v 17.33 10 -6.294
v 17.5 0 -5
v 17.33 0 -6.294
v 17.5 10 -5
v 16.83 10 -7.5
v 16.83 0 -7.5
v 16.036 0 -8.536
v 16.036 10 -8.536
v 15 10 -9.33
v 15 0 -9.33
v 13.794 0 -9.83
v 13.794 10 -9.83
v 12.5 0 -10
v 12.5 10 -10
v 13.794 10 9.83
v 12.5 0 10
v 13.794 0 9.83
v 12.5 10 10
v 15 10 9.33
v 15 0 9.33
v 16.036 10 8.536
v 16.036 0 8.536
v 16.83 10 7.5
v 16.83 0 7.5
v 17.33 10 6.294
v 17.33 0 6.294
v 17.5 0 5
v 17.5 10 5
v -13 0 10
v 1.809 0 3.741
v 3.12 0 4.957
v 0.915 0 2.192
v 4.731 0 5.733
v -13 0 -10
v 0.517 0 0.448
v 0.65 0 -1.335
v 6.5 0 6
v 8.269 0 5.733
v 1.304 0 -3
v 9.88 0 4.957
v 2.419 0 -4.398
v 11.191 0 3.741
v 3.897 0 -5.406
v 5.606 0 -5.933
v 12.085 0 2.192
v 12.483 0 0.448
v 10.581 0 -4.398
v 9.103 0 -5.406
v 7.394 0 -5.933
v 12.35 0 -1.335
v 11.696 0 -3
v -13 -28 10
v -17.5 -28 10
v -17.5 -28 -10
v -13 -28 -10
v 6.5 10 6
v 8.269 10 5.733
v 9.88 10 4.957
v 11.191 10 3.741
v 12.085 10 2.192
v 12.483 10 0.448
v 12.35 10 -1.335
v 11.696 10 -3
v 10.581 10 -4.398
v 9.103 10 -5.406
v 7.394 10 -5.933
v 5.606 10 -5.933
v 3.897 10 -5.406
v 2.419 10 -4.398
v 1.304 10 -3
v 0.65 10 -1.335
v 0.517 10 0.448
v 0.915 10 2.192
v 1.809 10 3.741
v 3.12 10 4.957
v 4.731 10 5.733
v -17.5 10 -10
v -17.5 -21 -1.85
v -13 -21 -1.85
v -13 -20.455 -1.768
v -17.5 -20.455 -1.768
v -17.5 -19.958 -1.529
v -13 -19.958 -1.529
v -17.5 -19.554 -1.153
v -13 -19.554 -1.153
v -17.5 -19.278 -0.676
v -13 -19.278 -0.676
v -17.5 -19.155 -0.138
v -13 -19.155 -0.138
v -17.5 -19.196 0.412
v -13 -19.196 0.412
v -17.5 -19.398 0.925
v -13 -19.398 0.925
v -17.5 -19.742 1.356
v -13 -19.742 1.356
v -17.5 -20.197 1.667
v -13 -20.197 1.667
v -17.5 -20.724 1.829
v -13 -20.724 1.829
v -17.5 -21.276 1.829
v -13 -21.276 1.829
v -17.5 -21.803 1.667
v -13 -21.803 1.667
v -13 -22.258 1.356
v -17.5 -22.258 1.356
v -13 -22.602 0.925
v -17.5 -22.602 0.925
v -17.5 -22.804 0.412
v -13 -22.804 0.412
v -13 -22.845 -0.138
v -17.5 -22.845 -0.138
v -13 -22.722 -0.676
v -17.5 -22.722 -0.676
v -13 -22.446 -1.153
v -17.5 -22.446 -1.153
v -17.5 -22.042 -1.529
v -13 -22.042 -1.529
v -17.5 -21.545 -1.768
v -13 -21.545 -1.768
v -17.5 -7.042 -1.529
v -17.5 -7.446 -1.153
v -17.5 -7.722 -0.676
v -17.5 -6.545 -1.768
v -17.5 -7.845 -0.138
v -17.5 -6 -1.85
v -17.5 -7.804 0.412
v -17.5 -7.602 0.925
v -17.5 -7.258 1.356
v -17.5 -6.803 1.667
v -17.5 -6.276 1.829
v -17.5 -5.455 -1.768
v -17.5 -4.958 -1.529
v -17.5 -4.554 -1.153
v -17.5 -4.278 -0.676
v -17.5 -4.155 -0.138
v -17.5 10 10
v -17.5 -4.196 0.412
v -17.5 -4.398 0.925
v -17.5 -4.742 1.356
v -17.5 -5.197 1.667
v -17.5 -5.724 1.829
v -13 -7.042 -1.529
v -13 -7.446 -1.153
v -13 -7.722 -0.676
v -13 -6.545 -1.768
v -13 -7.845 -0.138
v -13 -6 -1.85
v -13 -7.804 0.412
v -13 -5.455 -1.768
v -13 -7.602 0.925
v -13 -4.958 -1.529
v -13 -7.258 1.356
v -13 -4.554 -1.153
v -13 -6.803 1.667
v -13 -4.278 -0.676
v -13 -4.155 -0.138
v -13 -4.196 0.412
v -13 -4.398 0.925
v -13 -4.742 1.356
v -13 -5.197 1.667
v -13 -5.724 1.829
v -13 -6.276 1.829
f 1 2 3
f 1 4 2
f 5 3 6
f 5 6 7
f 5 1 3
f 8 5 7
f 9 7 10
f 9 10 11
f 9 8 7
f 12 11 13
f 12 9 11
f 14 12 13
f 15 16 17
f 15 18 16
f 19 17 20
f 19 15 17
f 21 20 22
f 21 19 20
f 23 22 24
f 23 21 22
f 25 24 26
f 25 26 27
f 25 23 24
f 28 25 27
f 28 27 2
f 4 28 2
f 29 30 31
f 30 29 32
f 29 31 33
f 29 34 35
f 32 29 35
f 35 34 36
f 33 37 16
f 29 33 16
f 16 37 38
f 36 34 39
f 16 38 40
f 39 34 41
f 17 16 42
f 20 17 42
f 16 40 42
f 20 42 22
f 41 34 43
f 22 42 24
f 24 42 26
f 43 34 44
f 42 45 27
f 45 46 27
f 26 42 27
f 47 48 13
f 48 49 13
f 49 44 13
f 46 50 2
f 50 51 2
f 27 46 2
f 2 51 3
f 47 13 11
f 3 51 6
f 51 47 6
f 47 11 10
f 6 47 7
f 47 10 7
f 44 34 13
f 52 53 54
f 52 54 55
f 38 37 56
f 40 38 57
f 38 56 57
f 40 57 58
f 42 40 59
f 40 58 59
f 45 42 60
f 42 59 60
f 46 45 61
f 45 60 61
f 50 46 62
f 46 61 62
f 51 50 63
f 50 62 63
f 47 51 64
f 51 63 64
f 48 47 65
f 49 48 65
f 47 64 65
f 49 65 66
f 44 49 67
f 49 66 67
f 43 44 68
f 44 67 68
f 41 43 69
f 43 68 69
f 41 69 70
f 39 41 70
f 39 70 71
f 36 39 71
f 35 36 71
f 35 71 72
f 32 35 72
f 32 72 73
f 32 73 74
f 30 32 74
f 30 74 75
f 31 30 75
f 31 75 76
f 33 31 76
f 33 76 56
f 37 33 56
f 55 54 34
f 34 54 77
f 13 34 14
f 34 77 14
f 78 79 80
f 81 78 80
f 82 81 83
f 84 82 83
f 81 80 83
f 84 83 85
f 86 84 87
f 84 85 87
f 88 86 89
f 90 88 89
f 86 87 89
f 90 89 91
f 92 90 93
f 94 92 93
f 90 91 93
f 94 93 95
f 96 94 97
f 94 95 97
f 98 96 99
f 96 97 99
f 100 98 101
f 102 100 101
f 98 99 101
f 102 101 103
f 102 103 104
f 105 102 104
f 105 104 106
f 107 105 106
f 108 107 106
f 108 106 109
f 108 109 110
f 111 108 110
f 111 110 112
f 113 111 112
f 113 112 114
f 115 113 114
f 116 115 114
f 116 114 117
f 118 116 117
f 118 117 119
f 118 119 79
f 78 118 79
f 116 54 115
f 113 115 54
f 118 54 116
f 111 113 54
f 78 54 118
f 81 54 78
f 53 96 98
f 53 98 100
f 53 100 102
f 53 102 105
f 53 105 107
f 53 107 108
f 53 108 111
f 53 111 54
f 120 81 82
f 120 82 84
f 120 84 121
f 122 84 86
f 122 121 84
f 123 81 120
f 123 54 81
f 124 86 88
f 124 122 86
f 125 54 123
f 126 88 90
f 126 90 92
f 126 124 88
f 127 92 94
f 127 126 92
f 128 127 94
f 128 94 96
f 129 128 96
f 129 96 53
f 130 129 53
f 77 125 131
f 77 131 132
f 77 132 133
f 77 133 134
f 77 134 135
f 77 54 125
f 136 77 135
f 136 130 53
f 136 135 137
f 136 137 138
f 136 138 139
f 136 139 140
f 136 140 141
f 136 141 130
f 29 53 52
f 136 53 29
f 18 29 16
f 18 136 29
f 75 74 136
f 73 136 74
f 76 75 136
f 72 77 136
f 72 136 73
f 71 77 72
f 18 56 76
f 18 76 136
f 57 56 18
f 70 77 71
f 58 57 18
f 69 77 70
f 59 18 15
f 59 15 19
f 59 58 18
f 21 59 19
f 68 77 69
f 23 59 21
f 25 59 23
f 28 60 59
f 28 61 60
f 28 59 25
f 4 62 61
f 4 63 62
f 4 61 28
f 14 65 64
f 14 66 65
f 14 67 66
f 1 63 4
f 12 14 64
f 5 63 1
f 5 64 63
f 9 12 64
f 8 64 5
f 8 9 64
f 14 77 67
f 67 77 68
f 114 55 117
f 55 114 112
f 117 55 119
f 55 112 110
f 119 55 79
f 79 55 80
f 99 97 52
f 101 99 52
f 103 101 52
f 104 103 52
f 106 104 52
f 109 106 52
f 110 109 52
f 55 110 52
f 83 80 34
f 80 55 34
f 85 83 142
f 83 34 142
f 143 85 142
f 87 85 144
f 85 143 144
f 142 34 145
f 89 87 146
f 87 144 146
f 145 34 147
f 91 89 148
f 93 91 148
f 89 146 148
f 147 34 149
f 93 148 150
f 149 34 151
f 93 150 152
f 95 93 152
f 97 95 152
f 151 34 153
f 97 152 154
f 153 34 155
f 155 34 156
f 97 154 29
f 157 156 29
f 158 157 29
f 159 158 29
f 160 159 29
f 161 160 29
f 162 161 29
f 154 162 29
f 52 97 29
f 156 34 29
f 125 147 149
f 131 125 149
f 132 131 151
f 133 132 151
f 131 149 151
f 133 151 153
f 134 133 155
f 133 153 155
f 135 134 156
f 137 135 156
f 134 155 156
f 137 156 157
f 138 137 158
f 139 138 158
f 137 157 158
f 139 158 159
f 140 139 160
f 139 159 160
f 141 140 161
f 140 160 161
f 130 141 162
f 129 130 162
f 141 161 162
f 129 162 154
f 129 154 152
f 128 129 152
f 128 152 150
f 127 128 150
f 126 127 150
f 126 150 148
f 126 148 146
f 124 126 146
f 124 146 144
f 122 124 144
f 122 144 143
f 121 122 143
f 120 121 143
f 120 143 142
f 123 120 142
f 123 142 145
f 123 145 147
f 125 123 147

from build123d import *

# Parameters (mm, degrees)
SKETCH1_W           = 35
SKETCH1_H           = 20
BOSS_EXTRUDE1_DEPTH = 10
FILLET1_R           = 5
SKETCH4_R           = 6
CUT_EXTRUDE2_DEPTH  = 23.5
SKETCH5_W           = 4.5
SKETCH5_H           = 20
BOSS_EXTRUDE3_DEPTH = 28
SKETCH6_R           = 1.85
CUT_EXTRUDE3_DEPTH  = 43.594013664


with BuildPart() as part:
    # Sketch1 → Boss-Extrude1 (new body)
    with BuildSketch(Plane(origin=(0, 0, 0), x_dir=(1, 0, 0), z_dir=(0, 1, 0))):
        Rectangle(SKETCH1_W, SKETCH1_H)
    extrude(amount=BOSS_EXTRUDE1_DEPTH)

    # Fillet1
    fillet1_edges = [part.edges().sort_by_distance(p)[0] for p in [
        (17.5, 5, 10),
        (17.5, 5, -10),
    ]]
    fillet(fillet1_edges, radius=FILLET1_R)

    # Sketch4 → Cut-Extrude2 (cut, through all)
    with BuildSketch(Plane(origin=(0, 10, 0), x_dir=(1, 0, 0), z_dir=(0, 1, 0))):
        with Locations(Location((6.5, 0, 0), (0, 0, 270))):
            Circle(SKETCH4_R)
    extrude(amount=-CUT_EXTRUDE2_DEPTH, mode=Mode.SUBTRACT)

    # Sketch5 → Boss-Extrude3 (add)
    with BuildSketch(Plane.XZ):
        with Locations((-15.25, 0)):
            Rectangle(SKETCH5_W, SKETCH5_H)
    extrude(amount=BOSS_EXTRUDE3_DEPTH)

    # Sketch6 → Cut-Extrude3 (cut, through all)
    with BuildSketch(Plane(origin=(-13, 0, 0), x_dir=(0, 0, -1), z_dir=(1, 0, 0))):
        with Locations((0, -6)):
            Circle(SKETCH6_R)
        with Locations((0, -21)):
            Circle(SKETCH6_R)
    extrude(amount=-CUT_EXTRUDE3_DEPTH, mode=Mode.SUBTRACT)


solid = part.part
